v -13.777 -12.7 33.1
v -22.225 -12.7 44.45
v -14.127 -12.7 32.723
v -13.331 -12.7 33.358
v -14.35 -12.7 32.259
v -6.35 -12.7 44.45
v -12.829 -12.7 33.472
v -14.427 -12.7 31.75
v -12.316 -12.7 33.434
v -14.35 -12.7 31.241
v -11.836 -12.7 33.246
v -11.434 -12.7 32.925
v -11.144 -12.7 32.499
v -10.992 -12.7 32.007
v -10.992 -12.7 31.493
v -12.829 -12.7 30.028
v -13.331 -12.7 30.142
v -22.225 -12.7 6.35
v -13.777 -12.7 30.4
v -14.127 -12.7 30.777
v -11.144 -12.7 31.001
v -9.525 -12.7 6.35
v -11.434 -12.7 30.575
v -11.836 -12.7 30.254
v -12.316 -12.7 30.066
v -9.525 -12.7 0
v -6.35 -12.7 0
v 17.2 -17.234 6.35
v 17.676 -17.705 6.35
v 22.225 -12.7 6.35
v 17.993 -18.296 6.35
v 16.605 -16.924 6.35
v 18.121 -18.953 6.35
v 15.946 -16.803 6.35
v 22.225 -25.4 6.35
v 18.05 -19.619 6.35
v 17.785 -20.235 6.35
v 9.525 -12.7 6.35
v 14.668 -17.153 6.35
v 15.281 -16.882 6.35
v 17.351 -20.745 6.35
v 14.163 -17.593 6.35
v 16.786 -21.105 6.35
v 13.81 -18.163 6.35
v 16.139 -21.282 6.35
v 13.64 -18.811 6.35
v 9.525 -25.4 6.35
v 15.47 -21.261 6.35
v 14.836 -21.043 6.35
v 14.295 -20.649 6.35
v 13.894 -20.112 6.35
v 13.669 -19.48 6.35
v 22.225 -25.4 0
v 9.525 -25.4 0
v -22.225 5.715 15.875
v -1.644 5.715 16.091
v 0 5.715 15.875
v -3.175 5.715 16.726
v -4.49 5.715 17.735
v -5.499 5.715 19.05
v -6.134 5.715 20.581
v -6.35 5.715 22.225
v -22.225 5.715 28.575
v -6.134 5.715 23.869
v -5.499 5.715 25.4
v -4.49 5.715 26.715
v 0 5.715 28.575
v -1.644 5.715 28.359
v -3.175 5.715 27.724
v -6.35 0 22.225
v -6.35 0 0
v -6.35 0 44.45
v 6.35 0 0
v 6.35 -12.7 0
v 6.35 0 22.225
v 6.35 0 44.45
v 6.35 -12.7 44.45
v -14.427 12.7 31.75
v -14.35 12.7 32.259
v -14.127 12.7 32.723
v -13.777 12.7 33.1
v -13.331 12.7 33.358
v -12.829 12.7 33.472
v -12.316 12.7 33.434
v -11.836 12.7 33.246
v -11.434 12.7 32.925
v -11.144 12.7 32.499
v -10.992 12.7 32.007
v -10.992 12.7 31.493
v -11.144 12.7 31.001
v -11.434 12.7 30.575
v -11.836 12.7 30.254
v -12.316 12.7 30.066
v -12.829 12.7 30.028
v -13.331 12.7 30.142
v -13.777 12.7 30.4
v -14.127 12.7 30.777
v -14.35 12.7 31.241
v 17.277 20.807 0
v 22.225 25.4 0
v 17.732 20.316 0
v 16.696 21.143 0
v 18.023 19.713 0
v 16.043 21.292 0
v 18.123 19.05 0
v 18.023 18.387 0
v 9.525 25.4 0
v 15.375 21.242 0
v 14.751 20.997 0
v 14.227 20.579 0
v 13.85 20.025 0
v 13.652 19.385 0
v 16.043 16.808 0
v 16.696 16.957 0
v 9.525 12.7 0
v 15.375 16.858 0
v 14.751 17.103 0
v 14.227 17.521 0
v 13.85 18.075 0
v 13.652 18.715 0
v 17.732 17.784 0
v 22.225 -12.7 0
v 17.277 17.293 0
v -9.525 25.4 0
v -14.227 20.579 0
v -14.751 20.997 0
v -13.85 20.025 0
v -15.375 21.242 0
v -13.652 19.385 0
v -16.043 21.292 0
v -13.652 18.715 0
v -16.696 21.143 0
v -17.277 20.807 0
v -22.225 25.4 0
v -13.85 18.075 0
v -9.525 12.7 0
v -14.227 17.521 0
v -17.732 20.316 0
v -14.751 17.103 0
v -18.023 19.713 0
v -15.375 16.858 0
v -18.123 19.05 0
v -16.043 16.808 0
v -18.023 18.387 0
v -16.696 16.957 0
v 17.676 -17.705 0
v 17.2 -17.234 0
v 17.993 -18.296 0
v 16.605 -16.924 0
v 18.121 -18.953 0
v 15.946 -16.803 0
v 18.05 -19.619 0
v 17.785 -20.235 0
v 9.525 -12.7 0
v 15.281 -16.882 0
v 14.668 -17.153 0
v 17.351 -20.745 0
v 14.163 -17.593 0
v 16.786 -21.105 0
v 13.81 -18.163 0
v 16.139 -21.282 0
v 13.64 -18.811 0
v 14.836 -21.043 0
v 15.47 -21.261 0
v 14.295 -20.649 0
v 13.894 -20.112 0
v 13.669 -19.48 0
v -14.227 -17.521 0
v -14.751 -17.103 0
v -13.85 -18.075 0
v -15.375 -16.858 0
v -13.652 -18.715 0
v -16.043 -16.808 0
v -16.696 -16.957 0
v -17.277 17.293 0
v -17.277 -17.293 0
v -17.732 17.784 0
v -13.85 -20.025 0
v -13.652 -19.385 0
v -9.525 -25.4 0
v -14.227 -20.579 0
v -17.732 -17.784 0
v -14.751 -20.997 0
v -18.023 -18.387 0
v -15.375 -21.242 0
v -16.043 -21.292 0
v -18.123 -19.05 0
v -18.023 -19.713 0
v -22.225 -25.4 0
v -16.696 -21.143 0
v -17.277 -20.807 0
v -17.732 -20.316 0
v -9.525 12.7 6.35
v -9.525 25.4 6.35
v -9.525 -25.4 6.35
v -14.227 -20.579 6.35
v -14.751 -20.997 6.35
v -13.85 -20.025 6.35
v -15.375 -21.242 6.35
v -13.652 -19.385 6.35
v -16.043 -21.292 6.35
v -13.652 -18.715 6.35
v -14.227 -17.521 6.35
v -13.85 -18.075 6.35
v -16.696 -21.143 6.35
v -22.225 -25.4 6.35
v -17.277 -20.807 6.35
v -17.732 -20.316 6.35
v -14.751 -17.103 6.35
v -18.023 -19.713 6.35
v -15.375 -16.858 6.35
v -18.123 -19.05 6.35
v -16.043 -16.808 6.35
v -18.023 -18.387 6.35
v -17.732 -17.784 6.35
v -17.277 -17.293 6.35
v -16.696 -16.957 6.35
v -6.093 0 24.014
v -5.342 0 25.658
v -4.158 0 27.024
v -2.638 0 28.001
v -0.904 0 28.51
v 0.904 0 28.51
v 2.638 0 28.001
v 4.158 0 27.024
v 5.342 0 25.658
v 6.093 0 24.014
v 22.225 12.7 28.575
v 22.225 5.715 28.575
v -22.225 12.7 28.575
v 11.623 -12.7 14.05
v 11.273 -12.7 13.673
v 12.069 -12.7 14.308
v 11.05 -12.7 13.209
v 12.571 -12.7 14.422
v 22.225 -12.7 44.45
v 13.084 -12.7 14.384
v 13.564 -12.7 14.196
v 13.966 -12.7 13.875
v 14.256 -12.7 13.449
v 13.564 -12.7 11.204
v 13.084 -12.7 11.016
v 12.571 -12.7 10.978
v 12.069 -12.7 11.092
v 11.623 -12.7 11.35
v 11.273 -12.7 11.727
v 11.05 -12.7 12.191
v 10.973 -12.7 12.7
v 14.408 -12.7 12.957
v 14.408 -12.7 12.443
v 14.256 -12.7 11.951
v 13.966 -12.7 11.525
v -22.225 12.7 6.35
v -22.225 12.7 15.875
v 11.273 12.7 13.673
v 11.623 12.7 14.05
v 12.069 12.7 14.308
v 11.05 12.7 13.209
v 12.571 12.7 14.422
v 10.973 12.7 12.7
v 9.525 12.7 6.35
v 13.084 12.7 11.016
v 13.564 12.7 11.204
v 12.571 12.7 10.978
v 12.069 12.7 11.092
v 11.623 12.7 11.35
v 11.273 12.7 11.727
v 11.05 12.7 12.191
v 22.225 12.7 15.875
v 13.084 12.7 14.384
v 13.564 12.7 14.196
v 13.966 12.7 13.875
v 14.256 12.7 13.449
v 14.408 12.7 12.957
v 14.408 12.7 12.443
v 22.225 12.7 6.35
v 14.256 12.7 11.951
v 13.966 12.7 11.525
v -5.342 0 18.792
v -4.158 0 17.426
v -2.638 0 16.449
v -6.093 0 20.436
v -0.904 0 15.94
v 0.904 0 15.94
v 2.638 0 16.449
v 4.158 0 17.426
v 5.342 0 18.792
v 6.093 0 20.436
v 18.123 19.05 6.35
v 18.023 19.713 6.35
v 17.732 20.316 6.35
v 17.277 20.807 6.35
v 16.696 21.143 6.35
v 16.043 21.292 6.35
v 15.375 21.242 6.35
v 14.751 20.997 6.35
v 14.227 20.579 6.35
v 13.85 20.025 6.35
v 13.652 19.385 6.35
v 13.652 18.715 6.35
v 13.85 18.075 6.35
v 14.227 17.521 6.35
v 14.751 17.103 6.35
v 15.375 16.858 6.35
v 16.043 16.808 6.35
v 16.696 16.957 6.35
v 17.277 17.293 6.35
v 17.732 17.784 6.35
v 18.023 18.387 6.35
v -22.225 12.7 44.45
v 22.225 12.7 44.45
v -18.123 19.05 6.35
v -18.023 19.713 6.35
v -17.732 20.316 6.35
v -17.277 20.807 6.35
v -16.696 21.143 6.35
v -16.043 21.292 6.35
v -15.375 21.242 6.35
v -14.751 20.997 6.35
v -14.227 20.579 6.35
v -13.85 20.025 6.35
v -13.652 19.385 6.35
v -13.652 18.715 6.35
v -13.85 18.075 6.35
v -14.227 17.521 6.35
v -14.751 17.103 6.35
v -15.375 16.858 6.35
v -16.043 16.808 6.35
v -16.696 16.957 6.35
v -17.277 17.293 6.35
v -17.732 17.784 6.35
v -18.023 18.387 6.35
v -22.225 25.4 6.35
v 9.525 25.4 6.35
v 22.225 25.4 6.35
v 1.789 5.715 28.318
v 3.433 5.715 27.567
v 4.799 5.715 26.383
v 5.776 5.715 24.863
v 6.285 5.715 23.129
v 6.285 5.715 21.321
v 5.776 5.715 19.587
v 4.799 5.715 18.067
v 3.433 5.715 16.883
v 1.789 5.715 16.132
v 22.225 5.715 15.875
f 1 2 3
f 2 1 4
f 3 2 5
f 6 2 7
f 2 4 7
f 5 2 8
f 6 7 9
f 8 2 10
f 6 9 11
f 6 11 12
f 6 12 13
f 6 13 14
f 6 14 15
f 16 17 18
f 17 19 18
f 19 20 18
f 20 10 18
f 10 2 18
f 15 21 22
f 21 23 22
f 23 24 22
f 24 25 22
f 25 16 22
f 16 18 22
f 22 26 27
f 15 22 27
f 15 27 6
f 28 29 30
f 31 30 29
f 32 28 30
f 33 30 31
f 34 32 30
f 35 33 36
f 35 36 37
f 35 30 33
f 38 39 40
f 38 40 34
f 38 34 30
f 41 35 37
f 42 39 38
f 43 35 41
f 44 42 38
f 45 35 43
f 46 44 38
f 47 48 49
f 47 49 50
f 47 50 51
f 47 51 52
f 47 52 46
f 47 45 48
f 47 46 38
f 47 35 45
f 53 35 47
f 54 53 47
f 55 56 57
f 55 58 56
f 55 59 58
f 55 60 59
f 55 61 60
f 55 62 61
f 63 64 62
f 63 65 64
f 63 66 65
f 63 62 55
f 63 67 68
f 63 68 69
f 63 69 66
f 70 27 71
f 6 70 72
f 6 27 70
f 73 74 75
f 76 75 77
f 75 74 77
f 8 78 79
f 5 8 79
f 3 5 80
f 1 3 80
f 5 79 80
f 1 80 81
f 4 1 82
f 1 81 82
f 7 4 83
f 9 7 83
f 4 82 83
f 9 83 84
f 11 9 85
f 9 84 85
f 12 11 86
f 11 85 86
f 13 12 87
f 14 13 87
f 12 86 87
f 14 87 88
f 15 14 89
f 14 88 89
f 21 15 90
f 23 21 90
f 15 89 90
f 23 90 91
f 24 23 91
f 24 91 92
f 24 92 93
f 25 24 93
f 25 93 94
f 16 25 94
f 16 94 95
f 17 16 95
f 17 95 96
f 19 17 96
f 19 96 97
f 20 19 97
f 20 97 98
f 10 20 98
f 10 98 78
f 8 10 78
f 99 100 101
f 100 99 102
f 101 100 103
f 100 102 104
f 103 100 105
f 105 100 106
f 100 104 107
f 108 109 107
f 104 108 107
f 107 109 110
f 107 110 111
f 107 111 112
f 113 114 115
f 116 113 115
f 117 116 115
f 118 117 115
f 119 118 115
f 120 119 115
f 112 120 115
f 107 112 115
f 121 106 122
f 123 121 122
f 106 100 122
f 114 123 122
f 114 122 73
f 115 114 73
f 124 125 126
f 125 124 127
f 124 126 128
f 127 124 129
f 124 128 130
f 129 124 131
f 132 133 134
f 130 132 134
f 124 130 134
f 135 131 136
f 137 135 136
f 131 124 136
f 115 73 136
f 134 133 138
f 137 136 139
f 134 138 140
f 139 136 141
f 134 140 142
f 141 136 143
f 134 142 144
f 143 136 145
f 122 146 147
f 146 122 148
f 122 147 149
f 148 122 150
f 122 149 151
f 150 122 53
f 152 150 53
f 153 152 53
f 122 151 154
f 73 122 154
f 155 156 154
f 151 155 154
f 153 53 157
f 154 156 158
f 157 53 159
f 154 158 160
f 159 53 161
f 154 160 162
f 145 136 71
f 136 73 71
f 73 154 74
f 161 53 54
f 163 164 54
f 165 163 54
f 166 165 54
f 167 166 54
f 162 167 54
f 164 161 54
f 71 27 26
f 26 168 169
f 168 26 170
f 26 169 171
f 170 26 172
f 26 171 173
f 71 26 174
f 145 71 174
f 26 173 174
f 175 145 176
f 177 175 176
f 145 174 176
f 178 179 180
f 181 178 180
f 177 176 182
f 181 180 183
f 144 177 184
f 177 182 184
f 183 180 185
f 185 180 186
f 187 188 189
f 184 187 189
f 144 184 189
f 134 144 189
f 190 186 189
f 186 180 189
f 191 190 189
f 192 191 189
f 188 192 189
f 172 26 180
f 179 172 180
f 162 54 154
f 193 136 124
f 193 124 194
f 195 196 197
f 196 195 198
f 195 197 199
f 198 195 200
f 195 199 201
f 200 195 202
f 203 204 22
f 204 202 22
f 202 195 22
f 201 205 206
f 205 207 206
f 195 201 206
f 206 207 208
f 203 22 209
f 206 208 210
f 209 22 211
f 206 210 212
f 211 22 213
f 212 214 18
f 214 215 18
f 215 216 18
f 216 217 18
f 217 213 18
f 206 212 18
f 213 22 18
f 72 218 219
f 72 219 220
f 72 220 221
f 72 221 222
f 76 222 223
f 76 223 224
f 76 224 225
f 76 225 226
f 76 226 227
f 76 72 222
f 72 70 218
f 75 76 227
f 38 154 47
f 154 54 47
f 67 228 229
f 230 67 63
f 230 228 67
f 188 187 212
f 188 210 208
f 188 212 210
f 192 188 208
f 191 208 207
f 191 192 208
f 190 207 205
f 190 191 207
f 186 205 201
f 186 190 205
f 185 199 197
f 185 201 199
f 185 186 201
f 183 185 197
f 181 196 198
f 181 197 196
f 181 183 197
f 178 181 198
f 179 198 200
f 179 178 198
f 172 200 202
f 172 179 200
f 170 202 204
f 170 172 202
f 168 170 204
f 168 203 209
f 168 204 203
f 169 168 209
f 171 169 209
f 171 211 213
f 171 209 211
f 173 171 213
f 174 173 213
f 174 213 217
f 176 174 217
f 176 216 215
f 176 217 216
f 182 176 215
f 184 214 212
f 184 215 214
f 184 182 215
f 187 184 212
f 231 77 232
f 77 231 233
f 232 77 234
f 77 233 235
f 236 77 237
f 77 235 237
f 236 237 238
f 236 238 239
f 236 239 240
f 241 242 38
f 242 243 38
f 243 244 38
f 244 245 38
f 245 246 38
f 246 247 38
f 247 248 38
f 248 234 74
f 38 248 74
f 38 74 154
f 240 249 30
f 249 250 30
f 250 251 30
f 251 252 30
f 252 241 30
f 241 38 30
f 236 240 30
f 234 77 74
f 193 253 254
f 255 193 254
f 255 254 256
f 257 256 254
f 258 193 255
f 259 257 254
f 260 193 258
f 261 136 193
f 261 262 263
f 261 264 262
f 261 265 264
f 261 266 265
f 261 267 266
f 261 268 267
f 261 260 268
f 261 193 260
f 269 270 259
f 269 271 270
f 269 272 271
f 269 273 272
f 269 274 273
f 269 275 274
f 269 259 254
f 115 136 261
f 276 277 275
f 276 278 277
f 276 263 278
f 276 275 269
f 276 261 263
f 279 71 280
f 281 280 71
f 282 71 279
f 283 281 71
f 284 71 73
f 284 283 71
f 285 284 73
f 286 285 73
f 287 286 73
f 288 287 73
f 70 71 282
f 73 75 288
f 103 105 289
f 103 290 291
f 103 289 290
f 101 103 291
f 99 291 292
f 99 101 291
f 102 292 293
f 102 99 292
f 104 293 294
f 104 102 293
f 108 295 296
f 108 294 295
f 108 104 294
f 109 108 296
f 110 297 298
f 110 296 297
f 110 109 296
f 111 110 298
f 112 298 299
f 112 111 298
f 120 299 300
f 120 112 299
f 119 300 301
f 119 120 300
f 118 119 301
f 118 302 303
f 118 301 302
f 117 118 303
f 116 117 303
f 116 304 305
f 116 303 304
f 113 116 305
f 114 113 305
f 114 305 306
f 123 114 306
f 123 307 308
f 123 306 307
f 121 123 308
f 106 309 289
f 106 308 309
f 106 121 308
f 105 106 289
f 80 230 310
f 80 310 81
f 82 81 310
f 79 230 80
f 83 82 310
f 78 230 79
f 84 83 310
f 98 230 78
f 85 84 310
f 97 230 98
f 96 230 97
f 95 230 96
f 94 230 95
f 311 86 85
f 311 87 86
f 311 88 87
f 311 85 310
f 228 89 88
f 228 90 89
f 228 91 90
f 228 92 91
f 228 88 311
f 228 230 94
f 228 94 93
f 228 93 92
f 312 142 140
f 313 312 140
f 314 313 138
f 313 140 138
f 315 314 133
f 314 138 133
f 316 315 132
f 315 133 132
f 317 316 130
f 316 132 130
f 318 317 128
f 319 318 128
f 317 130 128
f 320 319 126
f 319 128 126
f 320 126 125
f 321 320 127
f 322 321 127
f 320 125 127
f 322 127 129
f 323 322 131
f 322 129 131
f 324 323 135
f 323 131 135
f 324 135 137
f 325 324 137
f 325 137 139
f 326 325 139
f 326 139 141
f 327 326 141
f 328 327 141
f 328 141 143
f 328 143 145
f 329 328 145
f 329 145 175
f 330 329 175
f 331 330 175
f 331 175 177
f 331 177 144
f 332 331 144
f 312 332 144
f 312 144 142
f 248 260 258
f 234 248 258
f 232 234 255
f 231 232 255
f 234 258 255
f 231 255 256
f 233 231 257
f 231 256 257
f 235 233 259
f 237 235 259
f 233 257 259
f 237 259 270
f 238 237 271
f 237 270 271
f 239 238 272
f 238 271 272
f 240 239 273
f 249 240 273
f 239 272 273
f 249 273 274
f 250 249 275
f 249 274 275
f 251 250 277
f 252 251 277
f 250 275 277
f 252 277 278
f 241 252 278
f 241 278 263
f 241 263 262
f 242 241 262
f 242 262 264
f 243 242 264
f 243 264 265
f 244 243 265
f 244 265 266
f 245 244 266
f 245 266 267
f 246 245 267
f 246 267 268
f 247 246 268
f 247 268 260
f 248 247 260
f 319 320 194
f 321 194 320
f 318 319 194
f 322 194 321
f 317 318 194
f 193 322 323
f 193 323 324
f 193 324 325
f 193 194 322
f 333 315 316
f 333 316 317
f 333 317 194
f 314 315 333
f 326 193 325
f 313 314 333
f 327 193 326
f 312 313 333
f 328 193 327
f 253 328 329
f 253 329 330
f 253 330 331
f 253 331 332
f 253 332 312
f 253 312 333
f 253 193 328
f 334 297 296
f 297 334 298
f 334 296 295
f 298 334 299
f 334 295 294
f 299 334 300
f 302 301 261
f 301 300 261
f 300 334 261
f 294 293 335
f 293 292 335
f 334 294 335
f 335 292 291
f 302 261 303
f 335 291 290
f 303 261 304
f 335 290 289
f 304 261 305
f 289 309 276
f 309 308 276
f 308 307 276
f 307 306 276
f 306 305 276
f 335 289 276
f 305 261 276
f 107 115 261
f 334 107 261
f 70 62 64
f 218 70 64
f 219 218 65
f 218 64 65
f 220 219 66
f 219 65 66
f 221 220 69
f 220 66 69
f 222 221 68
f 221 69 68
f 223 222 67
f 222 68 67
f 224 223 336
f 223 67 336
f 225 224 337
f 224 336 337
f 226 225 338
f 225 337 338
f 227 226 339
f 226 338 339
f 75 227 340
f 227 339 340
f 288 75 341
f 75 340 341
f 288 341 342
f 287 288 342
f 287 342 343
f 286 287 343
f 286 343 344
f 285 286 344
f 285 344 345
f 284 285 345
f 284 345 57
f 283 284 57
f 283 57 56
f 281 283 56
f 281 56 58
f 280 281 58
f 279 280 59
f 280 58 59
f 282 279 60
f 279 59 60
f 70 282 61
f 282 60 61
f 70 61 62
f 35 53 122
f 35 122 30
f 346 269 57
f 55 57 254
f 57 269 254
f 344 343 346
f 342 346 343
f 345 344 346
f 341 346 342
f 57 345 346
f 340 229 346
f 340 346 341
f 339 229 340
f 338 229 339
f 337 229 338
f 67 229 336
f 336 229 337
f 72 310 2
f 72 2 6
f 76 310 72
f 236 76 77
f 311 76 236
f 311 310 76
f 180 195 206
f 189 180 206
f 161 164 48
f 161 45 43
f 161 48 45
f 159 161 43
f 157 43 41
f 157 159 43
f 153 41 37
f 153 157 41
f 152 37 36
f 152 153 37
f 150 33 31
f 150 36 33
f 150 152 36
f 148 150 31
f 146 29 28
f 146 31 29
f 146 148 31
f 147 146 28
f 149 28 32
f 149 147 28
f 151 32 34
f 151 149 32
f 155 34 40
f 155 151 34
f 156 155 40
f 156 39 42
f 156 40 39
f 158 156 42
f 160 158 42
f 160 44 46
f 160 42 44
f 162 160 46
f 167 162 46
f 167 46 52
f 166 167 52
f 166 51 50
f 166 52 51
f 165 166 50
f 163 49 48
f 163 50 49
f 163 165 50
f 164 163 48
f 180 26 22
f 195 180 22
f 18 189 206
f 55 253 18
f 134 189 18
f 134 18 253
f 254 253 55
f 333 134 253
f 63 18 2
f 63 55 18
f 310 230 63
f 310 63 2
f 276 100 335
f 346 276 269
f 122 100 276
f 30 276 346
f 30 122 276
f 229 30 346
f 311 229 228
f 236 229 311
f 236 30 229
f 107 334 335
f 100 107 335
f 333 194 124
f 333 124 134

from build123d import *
from build123d import SkipClean  # not in build123d's __all__

# Parameters (mm, degrees)
F0_W             = 44.45
F0_H             = 25.4
F1_DEPTH         = 44.45
F2_W             = 12.7
F2_H             = 44.45
F3_DEPTH         = 12.7
F4_W             = 44.45
F4_H             = 12.7
F5_DEPTH         = 6.985
F7_D             = 12.7
F8_W             = 12.7
F8_H             = 6.35
F9_DEPTH         = 12.7
F9_COPIES2_COUNT = 2
F9_COPIES2_PITCH = 49.595085
F11_D            = 4.4958
F13_D            = 3.4544


# Not quite as in the source:
# - after a boolean that leaves OpenCascade's solid faulty, fix() repairs it
# - a length typed as a fraction of an inch, garbled in the dataset ("3 / 203.2 mm" for 3/8 in), is restored
# - a pattern or mirror of a feature is missing from the dataset's text; its kind, count and spacing are read off the source's solid


with BuildPart() as f1:
    # F0 (on Top) → F1 (new body)
    with BuildSketch(Plane.XY):
        Rectangle(F0_W, F0_H)
    extrude(amount=F1_DEPTH)

    # F2 (on face) → F3 (cut)
    with BuildSketch(Plane.XZ.offset(12.7)):
        with Locations((0, 22.225)):
            Rectangle(F2_W, F2_H)
    extrude(amount=-F3_DEPTH, mode=Mode.SUBTRACT)

    # F4 (on face) → F5 (cut)
    with BuildSketch(Plane(origin=(0, 12.7, 0), x_dir=(-1, 0, 0), z_dir=(0, 1, 0))):
        with Locations((0, 22.225)):
            Rectangle(F4_W, F4_H)
    extrude(amount=-F5_DEPTH, mode=Mode.SUBTRACT)

    # F7 (through all)
    with Locations(Plane.XZ.offset(12.7)):
        with Locations((0, 22.225)):
            Hole(F7_D / 2)

    # F8 (on face) → F9 (join)
    with BuildSketch(Plane(origin=(0, 12.7, 0), x_dir=(-1, 0, 0), z_dir=(0, 1, 0))):
        with Locations((15.875, 3.175)):
            Rectangle(F8_W, F8_H)
    f9 = extrude(amount=F9_DEPTH)

    # F9_copies: F9 across plane
    add(f9.mirror(Plane(origin=(0, 0, 0), x_dir=(0, 0, -1), z_dir=(0, -1, 0))), clean=False)

    # F9_copies1: F9 across plane
    add(f9.mirror(Plane(origin=(0, 0, 0), x_dir=(0, 0, 1), z_dir=(1, 0, 0))), clean=False)

    # F9_copies2: F9 ×2
    with SkipClean():  # cleaning this boolean's faces spoils the solid; the shape is the same uncleaned
        with Locations(*[Vector(0.6401843997, -0.7682212796, 0) * (i * F9_COPIES2_PITCH) for i in range(1, F9_COPIES2_COUNT)]):
            add(f9, clean=False)

    # F11 (through all)
    with Locations(Plane.XY.offset(6.35)):
        with Locations((-15.875, 19.05)):
            f11 = Hole(F11_D / 2)

    add(f1.part.fix(), mode=Mode.REPLACE)

    # F11_copies: F11 across plane
    add(f11.mirror(Plane(origin=(0, 0, 0), x_dir=(0, 0, -1), z_dir=(0, -1, 0))), clean=False, mode=Mode.SUBTRACT)

    # F11_copies1: F11 across plane
    add(f11.mirror(Plane(origin=(0, 0, 0), x_dir=(0, 0, 1), z_dir=(1, 0, 0))), clean=False, mode=Mode.SUBTRACT)

    # F11_copies2: F11 across plane
    add(f11.mirror(Plane(origin=(0, 0, 0), x_dir=(-0.7682212796, -0.6401843997, 0), z_dir=(0.6401843997, -0.7682212796, 0))), clean=False, mode=Mode.SUBTRACT)

    # F13 (through all)
    with Locations(Plane.XZ.offset(12.7)):
        with Locations((-12.7, 31.75), (12.7, 12.7)):
            Hole(F13_D / 2)


solid = f1.part
